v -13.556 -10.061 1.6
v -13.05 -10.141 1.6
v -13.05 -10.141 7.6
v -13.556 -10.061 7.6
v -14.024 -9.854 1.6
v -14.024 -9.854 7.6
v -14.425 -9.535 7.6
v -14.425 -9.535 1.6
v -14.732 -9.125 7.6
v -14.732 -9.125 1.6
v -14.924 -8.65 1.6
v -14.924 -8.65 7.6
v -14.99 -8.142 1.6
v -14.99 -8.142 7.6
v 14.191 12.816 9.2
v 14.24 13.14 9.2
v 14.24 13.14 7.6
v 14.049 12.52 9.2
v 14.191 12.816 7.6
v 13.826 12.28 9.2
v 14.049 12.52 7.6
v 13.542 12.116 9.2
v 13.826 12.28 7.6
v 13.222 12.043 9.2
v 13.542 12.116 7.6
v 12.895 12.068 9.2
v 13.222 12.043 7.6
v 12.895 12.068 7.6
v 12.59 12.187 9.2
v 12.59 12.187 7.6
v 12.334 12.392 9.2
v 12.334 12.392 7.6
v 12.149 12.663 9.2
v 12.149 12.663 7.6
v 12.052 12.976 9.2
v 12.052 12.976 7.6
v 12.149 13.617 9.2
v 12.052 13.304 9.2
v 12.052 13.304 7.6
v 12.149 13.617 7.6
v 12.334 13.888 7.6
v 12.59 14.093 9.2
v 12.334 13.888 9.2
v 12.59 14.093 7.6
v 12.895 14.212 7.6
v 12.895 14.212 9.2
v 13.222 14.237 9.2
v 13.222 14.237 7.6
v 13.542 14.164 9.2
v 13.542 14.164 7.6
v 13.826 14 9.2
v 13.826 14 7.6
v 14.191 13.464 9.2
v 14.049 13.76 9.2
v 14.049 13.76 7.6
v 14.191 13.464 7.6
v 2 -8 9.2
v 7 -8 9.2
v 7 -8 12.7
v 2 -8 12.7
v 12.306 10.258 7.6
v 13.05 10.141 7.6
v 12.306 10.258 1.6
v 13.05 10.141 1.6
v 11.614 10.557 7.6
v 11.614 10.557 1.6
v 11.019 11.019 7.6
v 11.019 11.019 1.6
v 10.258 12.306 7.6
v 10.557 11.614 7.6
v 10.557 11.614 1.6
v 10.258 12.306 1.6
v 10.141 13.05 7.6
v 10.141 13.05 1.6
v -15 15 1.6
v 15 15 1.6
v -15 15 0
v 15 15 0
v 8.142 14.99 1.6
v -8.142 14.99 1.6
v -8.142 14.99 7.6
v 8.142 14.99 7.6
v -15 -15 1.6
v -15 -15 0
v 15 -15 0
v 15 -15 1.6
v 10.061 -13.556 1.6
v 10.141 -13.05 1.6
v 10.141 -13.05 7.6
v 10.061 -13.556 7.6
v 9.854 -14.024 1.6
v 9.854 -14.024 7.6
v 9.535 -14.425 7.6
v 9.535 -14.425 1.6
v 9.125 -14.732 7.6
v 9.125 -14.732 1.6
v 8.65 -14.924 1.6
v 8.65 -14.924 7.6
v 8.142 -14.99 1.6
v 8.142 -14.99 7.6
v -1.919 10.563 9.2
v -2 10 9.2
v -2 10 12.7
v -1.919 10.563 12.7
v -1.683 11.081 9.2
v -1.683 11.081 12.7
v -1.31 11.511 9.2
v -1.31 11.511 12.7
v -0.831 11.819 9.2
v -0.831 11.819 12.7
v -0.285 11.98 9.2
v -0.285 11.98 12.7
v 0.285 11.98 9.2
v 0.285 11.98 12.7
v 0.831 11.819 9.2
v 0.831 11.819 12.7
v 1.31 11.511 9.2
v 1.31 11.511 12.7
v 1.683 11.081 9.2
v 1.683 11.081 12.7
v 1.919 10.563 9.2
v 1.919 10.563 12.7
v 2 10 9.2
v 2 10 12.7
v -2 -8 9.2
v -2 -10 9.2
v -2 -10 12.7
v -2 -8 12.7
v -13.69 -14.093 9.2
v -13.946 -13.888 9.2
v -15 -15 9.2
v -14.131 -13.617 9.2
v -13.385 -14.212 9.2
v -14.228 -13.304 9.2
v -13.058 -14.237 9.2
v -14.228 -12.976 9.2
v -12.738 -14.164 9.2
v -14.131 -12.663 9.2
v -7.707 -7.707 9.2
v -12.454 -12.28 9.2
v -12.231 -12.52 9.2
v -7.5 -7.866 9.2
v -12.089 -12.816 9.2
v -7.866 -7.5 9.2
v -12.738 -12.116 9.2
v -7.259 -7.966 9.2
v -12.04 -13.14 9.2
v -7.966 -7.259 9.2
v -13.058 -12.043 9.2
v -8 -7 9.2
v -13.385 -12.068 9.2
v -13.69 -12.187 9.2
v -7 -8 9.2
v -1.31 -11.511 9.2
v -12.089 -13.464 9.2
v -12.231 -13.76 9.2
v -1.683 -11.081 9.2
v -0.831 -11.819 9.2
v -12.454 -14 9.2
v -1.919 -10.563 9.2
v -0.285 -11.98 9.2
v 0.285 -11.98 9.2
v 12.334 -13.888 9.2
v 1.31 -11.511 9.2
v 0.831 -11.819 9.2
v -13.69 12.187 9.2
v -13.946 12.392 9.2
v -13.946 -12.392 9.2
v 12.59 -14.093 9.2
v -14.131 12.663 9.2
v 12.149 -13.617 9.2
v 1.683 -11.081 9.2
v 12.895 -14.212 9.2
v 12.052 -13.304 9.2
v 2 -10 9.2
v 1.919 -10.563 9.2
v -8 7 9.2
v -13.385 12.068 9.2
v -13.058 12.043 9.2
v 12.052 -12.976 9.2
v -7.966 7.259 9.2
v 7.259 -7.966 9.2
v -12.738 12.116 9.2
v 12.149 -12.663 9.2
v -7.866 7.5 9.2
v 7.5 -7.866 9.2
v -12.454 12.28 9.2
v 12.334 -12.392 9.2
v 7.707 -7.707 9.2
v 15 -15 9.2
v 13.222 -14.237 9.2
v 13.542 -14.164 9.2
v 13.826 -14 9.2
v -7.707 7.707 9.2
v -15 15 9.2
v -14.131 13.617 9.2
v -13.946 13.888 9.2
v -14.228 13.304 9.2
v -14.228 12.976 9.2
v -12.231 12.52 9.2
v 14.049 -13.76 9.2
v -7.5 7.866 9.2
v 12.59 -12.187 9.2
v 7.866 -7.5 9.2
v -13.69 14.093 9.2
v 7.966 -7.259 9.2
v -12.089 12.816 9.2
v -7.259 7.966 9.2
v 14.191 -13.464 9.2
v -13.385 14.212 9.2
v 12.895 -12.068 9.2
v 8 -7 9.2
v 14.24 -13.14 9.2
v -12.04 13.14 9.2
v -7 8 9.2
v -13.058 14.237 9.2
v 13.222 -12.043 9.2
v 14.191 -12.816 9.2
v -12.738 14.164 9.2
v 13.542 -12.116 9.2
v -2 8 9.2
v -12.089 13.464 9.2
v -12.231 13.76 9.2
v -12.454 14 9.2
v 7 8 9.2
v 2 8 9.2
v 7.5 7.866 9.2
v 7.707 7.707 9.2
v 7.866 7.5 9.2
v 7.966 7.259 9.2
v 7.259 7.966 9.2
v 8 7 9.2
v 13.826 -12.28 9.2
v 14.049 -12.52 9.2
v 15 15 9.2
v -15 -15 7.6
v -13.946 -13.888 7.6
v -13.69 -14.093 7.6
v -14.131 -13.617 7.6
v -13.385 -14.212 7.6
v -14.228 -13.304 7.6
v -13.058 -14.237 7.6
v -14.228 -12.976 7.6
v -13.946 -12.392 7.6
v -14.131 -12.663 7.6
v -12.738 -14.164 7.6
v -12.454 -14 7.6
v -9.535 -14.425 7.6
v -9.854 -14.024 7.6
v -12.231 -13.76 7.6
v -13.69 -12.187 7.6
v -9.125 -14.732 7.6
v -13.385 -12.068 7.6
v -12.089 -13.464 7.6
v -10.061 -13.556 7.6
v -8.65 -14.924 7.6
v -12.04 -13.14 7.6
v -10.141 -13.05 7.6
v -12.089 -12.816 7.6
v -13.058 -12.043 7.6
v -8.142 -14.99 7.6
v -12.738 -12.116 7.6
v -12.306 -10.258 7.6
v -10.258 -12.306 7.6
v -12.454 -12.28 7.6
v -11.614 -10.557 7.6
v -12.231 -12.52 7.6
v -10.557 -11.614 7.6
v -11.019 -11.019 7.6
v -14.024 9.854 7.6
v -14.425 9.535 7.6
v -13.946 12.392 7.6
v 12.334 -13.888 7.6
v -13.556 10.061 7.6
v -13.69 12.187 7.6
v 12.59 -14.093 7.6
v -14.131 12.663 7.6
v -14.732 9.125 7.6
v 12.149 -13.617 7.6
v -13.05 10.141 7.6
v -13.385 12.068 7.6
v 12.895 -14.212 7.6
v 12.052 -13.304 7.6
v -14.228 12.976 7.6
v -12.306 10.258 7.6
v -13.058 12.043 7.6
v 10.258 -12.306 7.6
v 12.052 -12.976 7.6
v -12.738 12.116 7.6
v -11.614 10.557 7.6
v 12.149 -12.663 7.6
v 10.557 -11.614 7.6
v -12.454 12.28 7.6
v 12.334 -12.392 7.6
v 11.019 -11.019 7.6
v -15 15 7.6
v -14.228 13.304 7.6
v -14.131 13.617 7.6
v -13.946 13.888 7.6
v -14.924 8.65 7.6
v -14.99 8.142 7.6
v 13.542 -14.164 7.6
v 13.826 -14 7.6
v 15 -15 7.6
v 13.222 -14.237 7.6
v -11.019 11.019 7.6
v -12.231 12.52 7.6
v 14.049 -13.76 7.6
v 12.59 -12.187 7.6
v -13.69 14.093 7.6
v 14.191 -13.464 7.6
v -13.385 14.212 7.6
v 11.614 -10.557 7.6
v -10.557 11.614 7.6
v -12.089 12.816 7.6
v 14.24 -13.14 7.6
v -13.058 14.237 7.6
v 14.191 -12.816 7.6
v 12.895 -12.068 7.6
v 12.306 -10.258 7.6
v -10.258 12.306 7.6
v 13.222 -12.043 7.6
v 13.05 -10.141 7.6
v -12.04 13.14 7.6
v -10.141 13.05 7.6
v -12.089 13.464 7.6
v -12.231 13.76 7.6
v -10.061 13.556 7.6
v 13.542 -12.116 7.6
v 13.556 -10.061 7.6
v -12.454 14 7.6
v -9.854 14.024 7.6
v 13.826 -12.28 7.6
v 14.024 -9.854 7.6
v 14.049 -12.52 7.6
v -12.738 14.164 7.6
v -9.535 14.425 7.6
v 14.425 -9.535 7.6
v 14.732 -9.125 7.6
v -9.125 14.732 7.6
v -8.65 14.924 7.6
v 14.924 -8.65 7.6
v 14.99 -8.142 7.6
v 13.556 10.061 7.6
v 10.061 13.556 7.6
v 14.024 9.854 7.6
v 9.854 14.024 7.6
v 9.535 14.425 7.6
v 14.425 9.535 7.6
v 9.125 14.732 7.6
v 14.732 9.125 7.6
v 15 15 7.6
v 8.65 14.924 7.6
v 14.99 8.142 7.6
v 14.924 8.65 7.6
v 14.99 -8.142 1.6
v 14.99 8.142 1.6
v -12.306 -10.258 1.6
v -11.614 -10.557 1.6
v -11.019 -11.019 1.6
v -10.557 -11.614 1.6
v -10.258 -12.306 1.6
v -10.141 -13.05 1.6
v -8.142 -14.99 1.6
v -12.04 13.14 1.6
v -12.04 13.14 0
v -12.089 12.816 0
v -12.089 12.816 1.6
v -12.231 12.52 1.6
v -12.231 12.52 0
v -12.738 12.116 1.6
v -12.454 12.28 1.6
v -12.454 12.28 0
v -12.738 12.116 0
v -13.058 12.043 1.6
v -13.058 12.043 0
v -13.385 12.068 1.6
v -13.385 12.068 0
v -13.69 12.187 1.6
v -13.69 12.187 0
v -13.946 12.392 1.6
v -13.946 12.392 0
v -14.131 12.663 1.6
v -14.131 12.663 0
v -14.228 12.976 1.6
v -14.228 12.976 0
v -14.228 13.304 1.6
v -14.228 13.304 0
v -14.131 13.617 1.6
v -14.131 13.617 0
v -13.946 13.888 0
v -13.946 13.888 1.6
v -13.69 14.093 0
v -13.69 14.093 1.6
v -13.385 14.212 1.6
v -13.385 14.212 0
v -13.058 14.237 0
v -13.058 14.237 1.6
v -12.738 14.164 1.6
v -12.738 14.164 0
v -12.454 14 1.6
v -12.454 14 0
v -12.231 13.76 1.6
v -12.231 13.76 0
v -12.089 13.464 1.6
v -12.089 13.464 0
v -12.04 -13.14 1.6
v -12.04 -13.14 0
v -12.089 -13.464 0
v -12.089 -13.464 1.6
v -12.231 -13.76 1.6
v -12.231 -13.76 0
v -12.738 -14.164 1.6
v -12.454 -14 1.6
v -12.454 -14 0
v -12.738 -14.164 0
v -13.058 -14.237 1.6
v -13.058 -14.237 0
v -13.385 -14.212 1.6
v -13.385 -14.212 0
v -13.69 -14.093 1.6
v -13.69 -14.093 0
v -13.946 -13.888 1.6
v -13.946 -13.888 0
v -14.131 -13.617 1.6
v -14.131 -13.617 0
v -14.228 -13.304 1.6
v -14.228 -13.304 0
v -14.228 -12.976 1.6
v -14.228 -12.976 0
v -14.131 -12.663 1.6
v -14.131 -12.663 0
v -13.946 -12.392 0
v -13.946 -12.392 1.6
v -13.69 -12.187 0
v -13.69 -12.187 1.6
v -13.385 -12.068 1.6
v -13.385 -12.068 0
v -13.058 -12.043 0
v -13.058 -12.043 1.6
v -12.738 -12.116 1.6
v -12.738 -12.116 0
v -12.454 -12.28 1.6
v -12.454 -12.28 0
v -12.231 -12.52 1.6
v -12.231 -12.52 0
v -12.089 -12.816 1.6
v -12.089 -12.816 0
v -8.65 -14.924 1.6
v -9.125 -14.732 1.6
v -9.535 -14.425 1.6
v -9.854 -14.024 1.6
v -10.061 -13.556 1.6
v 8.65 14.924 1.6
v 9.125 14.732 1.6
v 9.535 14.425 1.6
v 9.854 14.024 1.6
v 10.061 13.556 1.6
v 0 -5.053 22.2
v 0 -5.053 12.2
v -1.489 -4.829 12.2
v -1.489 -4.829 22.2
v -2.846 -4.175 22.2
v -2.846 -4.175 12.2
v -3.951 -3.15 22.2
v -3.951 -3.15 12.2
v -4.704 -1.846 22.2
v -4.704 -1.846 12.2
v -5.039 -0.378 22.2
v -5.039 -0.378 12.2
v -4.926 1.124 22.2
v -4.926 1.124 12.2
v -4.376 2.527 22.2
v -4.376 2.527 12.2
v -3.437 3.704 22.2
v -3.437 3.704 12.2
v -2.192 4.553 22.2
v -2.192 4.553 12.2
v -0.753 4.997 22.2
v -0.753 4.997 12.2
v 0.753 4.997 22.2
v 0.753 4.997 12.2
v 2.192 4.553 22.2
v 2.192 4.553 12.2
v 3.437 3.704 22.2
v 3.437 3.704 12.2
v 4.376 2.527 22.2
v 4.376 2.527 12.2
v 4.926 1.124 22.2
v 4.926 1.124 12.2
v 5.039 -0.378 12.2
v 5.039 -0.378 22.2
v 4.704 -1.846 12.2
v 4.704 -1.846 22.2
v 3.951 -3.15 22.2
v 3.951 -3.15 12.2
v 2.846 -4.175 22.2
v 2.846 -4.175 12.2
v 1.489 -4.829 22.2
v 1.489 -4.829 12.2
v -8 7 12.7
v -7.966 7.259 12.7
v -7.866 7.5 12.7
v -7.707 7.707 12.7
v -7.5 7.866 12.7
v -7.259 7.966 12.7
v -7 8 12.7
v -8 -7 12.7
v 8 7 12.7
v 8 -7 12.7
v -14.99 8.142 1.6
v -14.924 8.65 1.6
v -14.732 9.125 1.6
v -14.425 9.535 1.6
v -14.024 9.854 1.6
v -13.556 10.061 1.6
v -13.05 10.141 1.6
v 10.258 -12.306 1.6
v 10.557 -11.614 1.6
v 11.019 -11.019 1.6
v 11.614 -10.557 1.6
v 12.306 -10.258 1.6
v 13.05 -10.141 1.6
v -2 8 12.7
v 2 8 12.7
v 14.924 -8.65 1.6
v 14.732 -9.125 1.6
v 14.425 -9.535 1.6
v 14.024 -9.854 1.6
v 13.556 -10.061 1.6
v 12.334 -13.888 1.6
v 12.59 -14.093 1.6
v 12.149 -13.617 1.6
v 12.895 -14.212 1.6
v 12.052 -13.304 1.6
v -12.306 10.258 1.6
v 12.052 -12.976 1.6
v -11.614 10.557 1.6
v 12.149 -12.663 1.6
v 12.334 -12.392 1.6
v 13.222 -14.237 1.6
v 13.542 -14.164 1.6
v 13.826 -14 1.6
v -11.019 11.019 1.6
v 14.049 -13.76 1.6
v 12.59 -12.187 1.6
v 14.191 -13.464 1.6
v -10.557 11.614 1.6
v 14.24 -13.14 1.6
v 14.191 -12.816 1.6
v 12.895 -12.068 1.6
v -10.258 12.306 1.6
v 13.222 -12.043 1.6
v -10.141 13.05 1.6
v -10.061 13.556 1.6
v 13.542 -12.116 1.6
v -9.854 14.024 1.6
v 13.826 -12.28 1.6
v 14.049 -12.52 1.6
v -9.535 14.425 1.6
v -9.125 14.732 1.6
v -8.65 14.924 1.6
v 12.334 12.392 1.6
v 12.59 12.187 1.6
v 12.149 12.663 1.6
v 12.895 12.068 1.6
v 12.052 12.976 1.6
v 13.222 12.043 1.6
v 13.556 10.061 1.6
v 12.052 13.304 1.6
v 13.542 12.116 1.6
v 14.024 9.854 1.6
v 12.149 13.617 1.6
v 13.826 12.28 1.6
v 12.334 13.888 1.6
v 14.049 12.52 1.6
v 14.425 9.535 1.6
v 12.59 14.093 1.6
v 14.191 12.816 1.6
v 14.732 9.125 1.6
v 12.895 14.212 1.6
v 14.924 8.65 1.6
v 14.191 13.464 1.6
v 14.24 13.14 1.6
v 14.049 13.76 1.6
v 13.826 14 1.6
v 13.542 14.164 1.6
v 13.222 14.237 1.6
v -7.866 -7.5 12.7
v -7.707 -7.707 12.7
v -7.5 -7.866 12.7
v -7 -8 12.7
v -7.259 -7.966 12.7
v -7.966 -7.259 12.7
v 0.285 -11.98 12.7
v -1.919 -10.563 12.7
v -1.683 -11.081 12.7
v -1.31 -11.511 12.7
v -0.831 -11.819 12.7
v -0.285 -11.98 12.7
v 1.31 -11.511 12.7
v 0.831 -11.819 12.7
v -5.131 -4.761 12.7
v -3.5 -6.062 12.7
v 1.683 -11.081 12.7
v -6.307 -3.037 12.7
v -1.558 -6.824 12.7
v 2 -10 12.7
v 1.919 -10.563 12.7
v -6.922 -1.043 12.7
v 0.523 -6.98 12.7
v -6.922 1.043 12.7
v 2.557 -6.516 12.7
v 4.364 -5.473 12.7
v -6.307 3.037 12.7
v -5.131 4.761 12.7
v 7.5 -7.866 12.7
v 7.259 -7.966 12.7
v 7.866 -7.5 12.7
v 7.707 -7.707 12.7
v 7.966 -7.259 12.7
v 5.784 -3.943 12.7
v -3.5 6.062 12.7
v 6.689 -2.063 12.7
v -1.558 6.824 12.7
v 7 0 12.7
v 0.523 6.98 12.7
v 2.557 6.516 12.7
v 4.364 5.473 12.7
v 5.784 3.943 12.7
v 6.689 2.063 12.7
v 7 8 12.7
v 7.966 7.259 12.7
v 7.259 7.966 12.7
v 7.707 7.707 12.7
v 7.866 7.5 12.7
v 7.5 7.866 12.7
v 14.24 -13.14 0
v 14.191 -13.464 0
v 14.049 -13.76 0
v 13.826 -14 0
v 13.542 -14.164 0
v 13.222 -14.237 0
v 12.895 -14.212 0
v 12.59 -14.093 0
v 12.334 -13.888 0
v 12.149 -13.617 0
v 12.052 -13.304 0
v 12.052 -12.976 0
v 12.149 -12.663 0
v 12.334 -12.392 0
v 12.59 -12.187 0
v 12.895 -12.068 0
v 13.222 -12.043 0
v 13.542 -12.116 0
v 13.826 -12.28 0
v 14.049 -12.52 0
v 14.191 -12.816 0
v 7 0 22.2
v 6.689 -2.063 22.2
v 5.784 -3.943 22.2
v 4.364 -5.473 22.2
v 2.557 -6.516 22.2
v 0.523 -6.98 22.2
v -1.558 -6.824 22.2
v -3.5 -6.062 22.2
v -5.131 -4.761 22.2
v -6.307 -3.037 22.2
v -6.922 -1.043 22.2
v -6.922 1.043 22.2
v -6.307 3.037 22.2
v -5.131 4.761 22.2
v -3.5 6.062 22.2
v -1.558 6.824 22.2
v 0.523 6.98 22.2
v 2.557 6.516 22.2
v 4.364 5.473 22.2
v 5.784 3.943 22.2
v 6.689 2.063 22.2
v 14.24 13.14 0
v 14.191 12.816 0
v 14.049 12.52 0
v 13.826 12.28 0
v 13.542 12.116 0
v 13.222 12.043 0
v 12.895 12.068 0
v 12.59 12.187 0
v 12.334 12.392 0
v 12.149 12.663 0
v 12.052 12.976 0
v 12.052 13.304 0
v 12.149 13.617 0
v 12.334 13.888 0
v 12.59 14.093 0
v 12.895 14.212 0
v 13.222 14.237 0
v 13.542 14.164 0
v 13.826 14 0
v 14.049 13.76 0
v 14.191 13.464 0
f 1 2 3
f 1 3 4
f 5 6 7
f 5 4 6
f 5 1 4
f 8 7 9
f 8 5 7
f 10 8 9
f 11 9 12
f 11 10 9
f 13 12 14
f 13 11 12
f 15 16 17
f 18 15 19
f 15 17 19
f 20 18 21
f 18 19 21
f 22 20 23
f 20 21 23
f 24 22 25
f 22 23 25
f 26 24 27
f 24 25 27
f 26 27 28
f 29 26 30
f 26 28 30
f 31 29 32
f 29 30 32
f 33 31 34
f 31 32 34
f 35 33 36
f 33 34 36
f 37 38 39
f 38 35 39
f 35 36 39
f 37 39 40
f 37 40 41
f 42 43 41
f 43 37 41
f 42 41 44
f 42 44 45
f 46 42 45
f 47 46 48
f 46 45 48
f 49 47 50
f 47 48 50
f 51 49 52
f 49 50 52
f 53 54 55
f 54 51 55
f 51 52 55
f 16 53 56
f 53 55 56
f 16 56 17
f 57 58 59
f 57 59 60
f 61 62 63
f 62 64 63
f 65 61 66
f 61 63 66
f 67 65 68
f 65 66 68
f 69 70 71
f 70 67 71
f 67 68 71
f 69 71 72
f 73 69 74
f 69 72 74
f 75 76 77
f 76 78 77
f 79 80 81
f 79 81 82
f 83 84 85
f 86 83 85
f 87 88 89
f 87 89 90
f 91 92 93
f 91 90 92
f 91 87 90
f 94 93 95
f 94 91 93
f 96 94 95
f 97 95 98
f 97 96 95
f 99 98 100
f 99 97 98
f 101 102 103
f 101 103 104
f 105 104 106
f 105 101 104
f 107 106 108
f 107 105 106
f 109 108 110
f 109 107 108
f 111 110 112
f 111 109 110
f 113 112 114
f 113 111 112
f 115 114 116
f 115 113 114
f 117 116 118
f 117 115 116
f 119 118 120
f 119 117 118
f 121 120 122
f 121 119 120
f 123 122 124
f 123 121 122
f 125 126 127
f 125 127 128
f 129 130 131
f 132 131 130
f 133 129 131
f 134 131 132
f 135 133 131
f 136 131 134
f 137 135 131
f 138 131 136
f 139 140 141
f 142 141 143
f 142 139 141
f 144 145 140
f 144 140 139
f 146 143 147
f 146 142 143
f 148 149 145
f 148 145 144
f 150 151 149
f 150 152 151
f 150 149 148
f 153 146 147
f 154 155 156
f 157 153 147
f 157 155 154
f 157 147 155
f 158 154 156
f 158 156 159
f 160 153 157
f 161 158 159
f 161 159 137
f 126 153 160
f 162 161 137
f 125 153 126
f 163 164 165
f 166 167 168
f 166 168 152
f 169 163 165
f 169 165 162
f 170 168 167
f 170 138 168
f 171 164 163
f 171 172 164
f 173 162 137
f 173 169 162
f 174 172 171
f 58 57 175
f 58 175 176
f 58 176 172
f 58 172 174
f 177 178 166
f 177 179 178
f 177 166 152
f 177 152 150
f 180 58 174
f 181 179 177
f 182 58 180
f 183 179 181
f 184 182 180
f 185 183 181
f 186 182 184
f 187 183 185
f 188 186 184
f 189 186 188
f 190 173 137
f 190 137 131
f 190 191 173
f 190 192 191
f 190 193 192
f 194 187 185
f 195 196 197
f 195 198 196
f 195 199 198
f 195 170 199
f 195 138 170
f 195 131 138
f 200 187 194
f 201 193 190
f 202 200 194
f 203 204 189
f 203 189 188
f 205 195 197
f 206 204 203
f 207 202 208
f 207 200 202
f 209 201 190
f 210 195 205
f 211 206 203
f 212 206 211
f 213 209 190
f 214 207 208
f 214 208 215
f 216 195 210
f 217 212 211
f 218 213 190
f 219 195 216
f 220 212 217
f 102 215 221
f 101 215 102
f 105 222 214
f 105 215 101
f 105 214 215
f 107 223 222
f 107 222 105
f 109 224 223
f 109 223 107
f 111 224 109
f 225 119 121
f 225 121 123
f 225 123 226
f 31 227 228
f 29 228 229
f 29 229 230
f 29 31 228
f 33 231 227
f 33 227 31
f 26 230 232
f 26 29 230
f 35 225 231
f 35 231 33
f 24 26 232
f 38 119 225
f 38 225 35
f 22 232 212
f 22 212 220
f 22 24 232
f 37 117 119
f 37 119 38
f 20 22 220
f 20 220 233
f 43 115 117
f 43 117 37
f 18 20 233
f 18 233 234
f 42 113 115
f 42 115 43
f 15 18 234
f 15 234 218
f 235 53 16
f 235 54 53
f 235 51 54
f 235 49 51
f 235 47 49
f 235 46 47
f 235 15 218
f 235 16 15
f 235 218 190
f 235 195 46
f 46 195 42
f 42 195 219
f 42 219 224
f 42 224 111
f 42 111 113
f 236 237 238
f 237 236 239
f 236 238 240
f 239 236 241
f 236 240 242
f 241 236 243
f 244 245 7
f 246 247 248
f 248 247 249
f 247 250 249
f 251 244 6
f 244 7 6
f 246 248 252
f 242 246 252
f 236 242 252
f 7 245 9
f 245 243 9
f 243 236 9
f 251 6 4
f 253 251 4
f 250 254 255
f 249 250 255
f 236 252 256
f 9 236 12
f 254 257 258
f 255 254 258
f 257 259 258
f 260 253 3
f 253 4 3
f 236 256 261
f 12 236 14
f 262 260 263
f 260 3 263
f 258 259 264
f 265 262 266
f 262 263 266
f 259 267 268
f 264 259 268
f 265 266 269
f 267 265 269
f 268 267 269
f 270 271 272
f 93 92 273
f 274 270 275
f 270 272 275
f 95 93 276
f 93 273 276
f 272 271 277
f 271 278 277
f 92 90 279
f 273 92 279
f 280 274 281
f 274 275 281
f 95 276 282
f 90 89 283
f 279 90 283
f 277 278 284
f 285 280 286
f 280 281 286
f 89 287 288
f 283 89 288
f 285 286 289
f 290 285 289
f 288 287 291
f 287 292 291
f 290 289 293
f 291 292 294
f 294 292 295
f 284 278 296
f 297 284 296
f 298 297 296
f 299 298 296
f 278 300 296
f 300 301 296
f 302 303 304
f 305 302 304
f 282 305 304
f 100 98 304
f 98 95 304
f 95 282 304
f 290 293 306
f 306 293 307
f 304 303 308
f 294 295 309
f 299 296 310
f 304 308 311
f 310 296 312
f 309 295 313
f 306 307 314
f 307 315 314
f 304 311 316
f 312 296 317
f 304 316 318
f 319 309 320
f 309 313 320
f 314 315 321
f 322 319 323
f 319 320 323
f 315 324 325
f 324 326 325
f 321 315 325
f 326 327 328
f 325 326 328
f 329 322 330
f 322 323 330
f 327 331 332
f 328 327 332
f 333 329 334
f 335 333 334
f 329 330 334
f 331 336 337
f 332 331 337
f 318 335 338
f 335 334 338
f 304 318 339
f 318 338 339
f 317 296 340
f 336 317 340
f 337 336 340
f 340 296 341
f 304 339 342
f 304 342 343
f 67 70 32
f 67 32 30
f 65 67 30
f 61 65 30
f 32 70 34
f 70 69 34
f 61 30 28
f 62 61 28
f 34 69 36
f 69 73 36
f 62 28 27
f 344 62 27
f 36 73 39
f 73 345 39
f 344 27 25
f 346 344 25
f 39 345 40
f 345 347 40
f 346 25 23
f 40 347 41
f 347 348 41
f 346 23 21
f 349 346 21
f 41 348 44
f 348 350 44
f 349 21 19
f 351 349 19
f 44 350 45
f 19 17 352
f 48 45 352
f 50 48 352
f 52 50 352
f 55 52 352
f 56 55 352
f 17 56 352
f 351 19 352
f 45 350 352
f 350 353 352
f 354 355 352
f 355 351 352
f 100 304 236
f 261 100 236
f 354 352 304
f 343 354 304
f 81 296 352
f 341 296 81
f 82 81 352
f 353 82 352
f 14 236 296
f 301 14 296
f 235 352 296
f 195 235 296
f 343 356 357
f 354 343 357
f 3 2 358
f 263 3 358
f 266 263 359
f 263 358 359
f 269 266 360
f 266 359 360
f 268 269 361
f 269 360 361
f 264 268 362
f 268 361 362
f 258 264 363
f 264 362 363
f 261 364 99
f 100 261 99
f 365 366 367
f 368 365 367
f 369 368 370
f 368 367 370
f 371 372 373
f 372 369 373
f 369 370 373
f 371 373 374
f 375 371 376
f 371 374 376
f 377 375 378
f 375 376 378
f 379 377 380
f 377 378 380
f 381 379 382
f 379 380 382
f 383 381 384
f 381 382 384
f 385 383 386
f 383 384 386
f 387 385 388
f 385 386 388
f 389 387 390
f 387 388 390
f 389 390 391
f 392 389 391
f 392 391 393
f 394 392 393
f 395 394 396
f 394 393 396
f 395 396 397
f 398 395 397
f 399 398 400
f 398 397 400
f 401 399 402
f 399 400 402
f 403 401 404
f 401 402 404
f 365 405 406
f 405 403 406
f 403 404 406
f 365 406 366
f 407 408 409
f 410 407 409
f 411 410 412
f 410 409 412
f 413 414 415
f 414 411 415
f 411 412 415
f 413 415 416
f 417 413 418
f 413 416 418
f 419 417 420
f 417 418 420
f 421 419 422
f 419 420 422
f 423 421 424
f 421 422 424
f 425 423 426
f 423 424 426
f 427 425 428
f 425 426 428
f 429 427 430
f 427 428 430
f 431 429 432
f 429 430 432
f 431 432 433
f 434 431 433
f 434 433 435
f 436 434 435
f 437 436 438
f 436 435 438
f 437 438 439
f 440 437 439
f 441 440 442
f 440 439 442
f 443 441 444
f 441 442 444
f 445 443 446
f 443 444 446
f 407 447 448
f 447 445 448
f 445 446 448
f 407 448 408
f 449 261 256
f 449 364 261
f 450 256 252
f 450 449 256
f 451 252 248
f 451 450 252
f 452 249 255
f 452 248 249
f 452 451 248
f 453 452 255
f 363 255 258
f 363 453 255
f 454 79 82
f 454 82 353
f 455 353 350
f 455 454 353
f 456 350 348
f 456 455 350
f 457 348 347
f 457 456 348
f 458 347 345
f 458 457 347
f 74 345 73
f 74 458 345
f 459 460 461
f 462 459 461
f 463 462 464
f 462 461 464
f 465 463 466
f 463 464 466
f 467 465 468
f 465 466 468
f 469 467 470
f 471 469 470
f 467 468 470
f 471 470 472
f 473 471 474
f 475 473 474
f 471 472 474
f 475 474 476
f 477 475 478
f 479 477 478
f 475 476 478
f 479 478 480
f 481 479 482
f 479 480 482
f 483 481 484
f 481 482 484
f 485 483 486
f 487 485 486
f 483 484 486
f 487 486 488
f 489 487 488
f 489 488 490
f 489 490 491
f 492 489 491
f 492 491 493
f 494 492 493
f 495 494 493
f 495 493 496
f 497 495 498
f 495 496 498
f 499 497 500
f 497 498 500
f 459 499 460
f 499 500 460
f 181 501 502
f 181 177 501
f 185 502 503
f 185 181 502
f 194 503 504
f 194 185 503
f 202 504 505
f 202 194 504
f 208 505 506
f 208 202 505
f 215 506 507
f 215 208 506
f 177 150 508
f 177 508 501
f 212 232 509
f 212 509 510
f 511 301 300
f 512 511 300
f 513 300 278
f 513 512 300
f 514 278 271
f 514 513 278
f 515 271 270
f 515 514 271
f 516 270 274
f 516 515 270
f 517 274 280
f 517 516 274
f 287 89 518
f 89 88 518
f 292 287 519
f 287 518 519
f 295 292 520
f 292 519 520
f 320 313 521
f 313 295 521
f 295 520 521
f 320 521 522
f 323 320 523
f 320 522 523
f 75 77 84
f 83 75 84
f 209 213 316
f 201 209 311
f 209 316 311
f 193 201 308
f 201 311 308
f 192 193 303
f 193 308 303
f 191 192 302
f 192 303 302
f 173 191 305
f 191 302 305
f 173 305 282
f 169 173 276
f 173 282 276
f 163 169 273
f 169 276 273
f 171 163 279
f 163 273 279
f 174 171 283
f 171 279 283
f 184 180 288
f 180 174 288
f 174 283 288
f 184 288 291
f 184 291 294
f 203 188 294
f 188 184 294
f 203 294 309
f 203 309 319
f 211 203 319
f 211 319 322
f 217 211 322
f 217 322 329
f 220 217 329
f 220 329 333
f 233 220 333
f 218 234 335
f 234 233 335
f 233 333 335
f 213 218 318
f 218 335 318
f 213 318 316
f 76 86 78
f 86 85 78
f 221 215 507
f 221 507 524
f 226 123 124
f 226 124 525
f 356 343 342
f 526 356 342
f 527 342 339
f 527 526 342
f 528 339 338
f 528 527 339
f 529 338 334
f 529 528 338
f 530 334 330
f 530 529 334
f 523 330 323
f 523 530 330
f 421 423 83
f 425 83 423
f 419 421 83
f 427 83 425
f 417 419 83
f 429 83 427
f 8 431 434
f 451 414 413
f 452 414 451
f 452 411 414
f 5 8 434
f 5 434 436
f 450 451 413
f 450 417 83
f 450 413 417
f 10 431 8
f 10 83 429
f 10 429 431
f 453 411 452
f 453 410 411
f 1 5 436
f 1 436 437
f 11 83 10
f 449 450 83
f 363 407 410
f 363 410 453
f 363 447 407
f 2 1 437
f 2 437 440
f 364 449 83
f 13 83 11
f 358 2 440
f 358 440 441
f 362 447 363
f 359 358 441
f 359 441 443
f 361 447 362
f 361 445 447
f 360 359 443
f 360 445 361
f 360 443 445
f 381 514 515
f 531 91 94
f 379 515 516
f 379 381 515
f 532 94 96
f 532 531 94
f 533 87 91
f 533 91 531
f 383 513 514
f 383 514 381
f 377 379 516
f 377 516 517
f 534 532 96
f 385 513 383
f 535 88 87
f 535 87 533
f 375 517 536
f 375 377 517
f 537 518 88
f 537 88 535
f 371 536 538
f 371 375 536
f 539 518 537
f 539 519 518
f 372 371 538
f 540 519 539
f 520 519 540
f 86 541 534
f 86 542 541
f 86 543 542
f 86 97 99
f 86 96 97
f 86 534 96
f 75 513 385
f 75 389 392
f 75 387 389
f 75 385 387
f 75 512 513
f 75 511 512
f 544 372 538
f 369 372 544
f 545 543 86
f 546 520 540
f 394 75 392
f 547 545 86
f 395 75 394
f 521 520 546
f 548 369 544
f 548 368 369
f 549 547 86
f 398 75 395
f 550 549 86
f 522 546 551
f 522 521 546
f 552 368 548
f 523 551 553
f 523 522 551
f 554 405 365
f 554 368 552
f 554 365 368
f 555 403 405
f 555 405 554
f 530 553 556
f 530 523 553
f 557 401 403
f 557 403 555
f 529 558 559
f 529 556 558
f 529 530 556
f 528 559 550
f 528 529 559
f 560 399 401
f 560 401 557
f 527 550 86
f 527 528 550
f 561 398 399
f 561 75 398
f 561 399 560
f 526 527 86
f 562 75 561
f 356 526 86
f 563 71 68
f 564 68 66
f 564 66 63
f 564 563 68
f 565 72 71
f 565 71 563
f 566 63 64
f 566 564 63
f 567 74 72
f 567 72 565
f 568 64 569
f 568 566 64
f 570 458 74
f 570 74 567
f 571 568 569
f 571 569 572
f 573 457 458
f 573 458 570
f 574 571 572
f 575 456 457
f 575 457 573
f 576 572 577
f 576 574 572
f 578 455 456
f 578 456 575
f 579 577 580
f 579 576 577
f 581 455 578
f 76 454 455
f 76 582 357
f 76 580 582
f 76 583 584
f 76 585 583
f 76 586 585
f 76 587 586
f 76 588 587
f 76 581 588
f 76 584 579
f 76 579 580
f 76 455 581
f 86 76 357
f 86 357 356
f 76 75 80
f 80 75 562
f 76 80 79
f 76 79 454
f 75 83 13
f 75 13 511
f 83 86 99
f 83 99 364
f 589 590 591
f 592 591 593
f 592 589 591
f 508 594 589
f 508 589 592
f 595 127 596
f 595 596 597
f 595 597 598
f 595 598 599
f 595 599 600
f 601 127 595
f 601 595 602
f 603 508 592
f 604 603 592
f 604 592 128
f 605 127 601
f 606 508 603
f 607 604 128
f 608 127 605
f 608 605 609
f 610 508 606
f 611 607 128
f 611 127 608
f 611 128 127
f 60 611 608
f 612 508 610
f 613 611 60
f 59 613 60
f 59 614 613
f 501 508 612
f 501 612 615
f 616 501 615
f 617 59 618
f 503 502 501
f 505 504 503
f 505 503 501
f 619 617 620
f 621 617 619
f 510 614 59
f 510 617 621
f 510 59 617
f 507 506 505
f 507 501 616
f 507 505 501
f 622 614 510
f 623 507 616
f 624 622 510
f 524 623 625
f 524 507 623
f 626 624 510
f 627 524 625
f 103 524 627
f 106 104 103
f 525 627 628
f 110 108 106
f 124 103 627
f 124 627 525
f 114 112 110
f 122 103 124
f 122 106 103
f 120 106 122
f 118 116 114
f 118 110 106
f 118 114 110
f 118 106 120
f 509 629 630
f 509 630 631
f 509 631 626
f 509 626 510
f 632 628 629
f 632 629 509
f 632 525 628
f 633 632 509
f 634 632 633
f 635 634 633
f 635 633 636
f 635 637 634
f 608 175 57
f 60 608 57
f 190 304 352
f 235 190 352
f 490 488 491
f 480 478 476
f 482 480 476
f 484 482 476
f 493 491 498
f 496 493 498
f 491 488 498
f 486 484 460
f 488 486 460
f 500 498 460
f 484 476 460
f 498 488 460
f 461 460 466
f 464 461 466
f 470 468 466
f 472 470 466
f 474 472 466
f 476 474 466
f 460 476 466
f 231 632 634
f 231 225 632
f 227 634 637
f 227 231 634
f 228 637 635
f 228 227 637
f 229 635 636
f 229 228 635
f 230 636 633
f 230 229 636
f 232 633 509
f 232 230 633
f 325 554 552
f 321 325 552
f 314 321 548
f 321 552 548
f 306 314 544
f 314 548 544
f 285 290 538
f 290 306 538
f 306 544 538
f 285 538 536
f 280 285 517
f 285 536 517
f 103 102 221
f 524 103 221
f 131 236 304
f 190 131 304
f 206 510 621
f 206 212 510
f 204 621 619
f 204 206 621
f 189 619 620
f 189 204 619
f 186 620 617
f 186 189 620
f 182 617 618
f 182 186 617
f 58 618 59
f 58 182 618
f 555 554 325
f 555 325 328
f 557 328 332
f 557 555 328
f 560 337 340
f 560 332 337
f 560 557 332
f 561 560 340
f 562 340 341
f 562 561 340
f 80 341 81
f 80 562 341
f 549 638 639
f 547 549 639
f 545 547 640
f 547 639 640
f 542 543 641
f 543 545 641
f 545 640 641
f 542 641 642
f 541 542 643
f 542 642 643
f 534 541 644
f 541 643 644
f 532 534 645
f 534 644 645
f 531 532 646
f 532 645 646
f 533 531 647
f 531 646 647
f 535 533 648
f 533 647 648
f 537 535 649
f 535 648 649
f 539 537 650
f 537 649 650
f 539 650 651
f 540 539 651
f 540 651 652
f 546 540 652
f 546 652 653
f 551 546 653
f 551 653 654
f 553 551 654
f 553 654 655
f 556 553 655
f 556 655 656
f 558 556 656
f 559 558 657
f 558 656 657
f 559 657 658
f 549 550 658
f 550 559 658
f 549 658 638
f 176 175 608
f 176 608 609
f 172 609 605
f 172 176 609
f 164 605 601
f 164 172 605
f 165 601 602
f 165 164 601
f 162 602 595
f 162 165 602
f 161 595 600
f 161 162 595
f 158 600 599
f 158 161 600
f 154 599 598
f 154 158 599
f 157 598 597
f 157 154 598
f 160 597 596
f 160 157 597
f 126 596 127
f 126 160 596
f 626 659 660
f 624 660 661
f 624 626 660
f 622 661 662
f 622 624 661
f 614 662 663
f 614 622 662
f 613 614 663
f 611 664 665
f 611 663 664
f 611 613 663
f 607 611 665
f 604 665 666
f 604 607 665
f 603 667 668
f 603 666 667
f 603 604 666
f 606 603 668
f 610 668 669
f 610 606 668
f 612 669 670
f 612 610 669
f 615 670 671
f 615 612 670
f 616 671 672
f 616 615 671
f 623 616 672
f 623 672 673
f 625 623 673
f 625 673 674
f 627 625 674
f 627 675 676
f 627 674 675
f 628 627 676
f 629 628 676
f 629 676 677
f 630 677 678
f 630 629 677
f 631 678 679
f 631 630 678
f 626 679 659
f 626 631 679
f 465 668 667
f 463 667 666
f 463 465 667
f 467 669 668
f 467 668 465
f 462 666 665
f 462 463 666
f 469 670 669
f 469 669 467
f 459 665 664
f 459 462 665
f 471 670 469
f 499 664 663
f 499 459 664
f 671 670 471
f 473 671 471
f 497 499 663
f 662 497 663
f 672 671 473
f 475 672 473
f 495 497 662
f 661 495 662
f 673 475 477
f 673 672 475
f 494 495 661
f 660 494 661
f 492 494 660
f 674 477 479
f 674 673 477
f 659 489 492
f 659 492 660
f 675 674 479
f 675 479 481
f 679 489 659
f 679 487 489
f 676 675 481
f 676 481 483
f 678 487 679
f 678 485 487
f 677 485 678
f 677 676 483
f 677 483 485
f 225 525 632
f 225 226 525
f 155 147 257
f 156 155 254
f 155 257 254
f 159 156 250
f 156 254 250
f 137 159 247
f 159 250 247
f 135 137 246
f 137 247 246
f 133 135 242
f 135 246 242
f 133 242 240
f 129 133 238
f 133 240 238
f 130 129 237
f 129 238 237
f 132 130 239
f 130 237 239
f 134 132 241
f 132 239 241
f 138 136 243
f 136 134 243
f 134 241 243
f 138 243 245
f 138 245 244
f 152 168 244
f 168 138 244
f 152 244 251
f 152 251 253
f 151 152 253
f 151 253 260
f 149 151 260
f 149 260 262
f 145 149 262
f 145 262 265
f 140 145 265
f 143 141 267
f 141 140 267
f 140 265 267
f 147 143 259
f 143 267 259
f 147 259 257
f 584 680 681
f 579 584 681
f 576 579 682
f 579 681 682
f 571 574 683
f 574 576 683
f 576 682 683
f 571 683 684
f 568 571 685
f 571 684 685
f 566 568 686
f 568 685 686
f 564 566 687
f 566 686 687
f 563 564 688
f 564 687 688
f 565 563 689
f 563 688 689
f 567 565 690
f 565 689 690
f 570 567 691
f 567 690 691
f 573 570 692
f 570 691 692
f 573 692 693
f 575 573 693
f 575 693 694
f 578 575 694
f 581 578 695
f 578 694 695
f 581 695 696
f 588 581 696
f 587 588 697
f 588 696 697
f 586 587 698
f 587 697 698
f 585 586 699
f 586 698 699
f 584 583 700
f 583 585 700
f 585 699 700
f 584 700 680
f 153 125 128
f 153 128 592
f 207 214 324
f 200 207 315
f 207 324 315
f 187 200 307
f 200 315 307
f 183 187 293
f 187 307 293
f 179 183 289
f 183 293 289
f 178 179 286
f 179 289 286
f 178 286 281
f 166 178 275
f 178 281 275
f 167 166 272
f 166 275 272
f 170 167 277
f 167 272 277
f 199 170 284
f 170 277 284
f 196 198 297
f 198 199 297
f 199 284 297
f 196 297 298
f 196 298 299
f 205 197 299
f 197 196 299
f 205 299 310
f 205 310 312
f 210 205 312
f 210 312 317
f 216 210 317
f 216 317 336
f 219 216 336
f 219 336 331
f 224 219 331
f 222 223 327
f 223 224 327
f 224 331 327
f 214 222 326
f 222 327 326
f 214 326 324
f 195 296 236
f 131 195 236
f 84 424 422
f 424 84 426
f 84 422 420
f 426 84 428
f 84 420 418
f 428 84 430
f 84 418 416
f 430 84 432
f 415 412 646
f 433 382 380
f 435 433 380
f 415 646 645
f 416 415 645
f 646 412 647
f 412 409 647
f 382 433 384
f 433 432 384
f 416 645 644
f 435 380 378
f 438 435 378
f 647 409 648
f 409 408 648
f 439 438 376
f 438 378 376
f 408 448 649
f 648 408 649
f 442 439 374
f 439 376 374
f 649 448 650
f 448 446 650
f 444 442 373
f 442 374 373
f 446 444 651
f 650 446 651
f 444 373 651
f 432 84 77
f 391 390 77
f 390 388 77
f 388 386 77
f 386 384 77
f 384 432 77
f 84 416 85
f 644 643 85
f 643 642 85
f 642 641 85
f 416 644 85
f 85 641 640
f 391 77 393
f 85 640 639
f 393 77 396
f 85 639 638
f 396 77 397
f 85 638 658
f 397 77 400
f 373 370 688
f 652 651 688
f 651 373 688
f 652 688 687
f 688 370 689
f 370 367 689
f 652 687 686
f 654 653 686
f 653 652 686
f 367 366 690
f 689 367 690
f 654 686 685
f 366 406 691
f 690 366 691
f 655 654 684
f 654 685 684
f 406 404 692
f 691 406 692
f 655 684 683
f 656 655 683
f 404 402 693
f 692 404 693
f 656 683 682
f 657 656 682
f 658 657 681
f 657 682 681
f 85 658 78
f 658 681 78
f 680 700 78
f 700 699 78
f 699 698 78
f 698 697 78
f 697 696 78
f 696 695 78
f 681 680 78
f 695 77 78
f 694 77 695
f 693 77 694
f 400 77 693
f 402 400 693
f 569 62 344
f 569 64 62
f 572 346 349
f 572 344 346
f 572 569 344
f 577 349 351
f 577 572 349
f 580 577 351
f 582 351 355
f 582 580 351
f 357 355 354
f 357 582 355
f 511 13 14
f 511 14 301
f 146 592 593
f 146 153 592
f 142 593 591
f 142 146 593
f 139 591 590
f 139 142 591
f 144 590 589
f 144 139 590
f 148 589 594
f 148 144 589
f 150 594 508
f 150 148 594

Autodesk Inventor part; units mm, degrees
ref_plane "YZ Plane" through (0, 0, 0) normal (1, 0, 0) x (0, 1, 0)
ref_plane "XZ Plane" through (0, 0, 0) normal (0, 1, 0) x (-1, 0, 0)
sketch "スケッチ1" plane through (0, 0, 0) normal (0, 0, 1) x (1, 0, 0)
  line L0 (-15, -15) -> (15, -15)
  line L1 (15, -15) -> (15, 15)
  line L2 (15, 15) -> (-15, 15)
  line L3 (-15, 15) -> (-15, -15)
  line L4 (-15, -15) -> (15, 15) construction
  line L5 (15, -15) -> (-15, 15) construction
  line L6 (-15, 0) -> (15, 0) construction
  line L7 (0, 15) -> (0, -15) construction
  line L8 (-13.14, 13.14) -> (13.14, 13.14) construction
  line L9 (13.14, 13.14) -> (13.14, -13.14) construction
  line L10 (13.14, -13.14) -> (-13.14, -13.14) construction
  line L11 (-13.14, -13.14) -> (-13.14, 13.14) construction
  line L12 (-13.14, 13.14) -> (13.14, -13.14) construction
  line L13 (13.14, 13.14) -> (-13.14, -13.14) construction
  circle A0 centre (0, 0) radius 7
  line L14 (-7, 8) -> (7, 8)
  line L15 (8, 7) -> (8, -7)
  line L16 (7, -8) -> (-7, -8)
  line L17 (-8, -7) -> (-8, 7)
  line L18 (-8, 8) -> (8, -8) construction
  line L19 (8, 8) -> (-8, -8) construction
  arc A1 (-8, -7) -> (-7, -8) centre (-7, -7) ccw
  arc A2 (7, -8) -> (8, -7) centre (7, -7) ccw
  arc A3 (8, 7) -> (7, 8) centre (7, 7) ccw
  arc A4 (-7, 8) -> (-8, 7) centre (-7, 7) ccw
  arc A5 (-2, -10) -> (2, -10) centre (0, -10) ccw
  line L20 (-2, -10) -> (-2, -8)
  line L21 (2, -10) -> (2, -8)
  arc A6 (2, 10) -> (-2, 10) centre (0, 10) ccw
  line L22 (-2, 10) -> (-2, 8)
  line L23 (2, 10) -> (2, 8)
  circle A7 centre (-13.14, -13.14) radius 1.1
  circle A8 centre (13.14, -13.14) radius 1.1
  circle A9 centre (-13.14, 13.14) radius 1.1
  circle A10 centre (13.14, 13.14) radius 1.1
  circle A11 centre (-13.14, -13.14) radius 2 construction
  circle A12 centre (13.14, -13.14) radius 2 construction
  circle A13 centre (-13.14, 13.14) radius 2 construction
  circle A14 centre (13.14, 13.14) radius 2 construction
  arc A15 (-10.1414, -13.05) -> (-13.05, -10.1414) centre (-13.14, -13.14) ccw
  line L24 (-14.99, -8.1423) -> (-14.99, 8.1423)
  line L25 (-8.1423, -14.99) -> (8.1423, -14.99)
  arc A16 (-14.99, -8.1423) -> (-13.05, -10.1414) centre (-12.99, -8.1423) ccw
  arc A17 (-10.1414, -13.05) -> (-8.1423, -14.99) centre (-8.1423, -12.99) ccw
  arc A18 (-13.05, 10.1414) -> (-10.1414, 13.05) centre (-13.14, 13.14) ccw
  line L26 (-8.1423, 14.99) -> (8.1423, 14.99)
  arc A19 (-13.05, 10.1414) -> (-14.99, 8.1423) centre (-12.99, 8.1423) ccw
  arc A20 (-8.1423, 14.99) -> (-10.1414, 13.05) centre (-8.1423, 12.99) ccw
  arc A21 (13.05, -10.1414) -> (10.1414, -13.05) centre (13.14, -13.14) ccw
  line L27 (14.99, -8.1423) -> (14.99, 8.1423)
  arc A22 (13.05, -10.1414) -> (14.99, -8.1423) centre (12.99, -8.1423) ccw
  arc A23 (8.1423, -14.99) -> (10.1414, -13.05) centre (8.1423, -12.99) ccw
  arc A24 (14.99, 8.1423) -> (13.05, 10.1414) centre (12.99, 8.1423) ccw
  arc A25 (10.1414, 13.05) -> (13.05, 10.1414) centre (13.14, 13.14) ccw
  arc A26 (10.1414, 13.05) -> (8.1423, 14.99) centre (8.1423, 12.99) ccw
  point P0 (-10.7783, -14.99)
  point P1 (-14.99, -10.7783)
  point P2 (-8, -2.8723)
  point P3 (-8, 2.8723)
  point P4 (-2.8723, 8)
  point P5 (-2, 8.2614)
  point P6 (2, 8.2614)
  point P7 (2.8723, 8)
  point P8 (8, 2.8723)
  point P9 (8, -2.8723)
  point P10 (2.8723, -8)
  point P11 (2, -8.2614)
  point P12 (-2, -8.2614)
  point P13 (-2.8723, -8)
  point P14 (8.1423, 14.99)
  point P15 (14.99, 8.1423)
  dimension "d0" = 30
  dimension "d1" = 30
  dimension "d2" = 26.28
  dimension "d3" = 26.28
  dimension "d4" = 14
  dimension "d5" = 16
  dimension "d6" = 16
  dimension "d7" = 1
  dimension "d8" = 20
  dimension "d9" = 2
  dimension "d10" = 2.2
  dimension "d11" = 4
  dimension "d12" = 2
  dimension "d13" = 3
  dimension "d14" = 0.01
  dimension "d15" = 0.01
extrude "押し出し1" add sketch "スケッチ1" along normal blind 9.2 contours L3 L2 L1 L0 | A0 | L14 A3 L15 A2 L16 A1 L17 A4 | L22 A6 L23 L14 | L16 L21 A5 L20 | A15 A16 L24 A19 A18 A20 L26 A26 A25 A24 L27 A22 A21 A23 L25 A17
extrude "押し出し2" cut sketch "スケッチ1" along normal blind 7.6 contours L3 L2 L1 L0 | A7 | A8 | A9 | A10
extrude "押し出し3" add sketch "スケッチ1" along normal blind 1.6 contours L3 L2 L1 L0
extrude "押し出し4" add sketch "スケッチ1" along normal blind 12.7 contours A0 | L14 A3 L15 A2 L16 A1 L17 A4 | L22 A6 L23 L14 | L16 L21 A5 L20
extrude "押し出し5" add sketch "スケッチ1" along normal blind 22.2 contours A0
sketch "Sketch3" plane through (0, 0, 22.2) normal (0, 0, 1) x (1, 0, 0)
  point P0 (0, 0)
  point P1 (0, 0)
hole "Hole1" at (0, 0, 22.2) direction (0, 0, -1) diameter 10.106 depth 10 thread size "M12x1.75" class "6H" standard "ANSI Metric M Profile"
ref_plane "Work Plane1" through (0, 0, 9.2) normal (0, 0, 1) x (1, 0, 0)
equation "\"d1\" = d0"
equation "\"d3\" = d2"
equation "\"d6\" = d5"
equation "\"d15\" = d14"
properties part number "e-CAM50_CUONX"
